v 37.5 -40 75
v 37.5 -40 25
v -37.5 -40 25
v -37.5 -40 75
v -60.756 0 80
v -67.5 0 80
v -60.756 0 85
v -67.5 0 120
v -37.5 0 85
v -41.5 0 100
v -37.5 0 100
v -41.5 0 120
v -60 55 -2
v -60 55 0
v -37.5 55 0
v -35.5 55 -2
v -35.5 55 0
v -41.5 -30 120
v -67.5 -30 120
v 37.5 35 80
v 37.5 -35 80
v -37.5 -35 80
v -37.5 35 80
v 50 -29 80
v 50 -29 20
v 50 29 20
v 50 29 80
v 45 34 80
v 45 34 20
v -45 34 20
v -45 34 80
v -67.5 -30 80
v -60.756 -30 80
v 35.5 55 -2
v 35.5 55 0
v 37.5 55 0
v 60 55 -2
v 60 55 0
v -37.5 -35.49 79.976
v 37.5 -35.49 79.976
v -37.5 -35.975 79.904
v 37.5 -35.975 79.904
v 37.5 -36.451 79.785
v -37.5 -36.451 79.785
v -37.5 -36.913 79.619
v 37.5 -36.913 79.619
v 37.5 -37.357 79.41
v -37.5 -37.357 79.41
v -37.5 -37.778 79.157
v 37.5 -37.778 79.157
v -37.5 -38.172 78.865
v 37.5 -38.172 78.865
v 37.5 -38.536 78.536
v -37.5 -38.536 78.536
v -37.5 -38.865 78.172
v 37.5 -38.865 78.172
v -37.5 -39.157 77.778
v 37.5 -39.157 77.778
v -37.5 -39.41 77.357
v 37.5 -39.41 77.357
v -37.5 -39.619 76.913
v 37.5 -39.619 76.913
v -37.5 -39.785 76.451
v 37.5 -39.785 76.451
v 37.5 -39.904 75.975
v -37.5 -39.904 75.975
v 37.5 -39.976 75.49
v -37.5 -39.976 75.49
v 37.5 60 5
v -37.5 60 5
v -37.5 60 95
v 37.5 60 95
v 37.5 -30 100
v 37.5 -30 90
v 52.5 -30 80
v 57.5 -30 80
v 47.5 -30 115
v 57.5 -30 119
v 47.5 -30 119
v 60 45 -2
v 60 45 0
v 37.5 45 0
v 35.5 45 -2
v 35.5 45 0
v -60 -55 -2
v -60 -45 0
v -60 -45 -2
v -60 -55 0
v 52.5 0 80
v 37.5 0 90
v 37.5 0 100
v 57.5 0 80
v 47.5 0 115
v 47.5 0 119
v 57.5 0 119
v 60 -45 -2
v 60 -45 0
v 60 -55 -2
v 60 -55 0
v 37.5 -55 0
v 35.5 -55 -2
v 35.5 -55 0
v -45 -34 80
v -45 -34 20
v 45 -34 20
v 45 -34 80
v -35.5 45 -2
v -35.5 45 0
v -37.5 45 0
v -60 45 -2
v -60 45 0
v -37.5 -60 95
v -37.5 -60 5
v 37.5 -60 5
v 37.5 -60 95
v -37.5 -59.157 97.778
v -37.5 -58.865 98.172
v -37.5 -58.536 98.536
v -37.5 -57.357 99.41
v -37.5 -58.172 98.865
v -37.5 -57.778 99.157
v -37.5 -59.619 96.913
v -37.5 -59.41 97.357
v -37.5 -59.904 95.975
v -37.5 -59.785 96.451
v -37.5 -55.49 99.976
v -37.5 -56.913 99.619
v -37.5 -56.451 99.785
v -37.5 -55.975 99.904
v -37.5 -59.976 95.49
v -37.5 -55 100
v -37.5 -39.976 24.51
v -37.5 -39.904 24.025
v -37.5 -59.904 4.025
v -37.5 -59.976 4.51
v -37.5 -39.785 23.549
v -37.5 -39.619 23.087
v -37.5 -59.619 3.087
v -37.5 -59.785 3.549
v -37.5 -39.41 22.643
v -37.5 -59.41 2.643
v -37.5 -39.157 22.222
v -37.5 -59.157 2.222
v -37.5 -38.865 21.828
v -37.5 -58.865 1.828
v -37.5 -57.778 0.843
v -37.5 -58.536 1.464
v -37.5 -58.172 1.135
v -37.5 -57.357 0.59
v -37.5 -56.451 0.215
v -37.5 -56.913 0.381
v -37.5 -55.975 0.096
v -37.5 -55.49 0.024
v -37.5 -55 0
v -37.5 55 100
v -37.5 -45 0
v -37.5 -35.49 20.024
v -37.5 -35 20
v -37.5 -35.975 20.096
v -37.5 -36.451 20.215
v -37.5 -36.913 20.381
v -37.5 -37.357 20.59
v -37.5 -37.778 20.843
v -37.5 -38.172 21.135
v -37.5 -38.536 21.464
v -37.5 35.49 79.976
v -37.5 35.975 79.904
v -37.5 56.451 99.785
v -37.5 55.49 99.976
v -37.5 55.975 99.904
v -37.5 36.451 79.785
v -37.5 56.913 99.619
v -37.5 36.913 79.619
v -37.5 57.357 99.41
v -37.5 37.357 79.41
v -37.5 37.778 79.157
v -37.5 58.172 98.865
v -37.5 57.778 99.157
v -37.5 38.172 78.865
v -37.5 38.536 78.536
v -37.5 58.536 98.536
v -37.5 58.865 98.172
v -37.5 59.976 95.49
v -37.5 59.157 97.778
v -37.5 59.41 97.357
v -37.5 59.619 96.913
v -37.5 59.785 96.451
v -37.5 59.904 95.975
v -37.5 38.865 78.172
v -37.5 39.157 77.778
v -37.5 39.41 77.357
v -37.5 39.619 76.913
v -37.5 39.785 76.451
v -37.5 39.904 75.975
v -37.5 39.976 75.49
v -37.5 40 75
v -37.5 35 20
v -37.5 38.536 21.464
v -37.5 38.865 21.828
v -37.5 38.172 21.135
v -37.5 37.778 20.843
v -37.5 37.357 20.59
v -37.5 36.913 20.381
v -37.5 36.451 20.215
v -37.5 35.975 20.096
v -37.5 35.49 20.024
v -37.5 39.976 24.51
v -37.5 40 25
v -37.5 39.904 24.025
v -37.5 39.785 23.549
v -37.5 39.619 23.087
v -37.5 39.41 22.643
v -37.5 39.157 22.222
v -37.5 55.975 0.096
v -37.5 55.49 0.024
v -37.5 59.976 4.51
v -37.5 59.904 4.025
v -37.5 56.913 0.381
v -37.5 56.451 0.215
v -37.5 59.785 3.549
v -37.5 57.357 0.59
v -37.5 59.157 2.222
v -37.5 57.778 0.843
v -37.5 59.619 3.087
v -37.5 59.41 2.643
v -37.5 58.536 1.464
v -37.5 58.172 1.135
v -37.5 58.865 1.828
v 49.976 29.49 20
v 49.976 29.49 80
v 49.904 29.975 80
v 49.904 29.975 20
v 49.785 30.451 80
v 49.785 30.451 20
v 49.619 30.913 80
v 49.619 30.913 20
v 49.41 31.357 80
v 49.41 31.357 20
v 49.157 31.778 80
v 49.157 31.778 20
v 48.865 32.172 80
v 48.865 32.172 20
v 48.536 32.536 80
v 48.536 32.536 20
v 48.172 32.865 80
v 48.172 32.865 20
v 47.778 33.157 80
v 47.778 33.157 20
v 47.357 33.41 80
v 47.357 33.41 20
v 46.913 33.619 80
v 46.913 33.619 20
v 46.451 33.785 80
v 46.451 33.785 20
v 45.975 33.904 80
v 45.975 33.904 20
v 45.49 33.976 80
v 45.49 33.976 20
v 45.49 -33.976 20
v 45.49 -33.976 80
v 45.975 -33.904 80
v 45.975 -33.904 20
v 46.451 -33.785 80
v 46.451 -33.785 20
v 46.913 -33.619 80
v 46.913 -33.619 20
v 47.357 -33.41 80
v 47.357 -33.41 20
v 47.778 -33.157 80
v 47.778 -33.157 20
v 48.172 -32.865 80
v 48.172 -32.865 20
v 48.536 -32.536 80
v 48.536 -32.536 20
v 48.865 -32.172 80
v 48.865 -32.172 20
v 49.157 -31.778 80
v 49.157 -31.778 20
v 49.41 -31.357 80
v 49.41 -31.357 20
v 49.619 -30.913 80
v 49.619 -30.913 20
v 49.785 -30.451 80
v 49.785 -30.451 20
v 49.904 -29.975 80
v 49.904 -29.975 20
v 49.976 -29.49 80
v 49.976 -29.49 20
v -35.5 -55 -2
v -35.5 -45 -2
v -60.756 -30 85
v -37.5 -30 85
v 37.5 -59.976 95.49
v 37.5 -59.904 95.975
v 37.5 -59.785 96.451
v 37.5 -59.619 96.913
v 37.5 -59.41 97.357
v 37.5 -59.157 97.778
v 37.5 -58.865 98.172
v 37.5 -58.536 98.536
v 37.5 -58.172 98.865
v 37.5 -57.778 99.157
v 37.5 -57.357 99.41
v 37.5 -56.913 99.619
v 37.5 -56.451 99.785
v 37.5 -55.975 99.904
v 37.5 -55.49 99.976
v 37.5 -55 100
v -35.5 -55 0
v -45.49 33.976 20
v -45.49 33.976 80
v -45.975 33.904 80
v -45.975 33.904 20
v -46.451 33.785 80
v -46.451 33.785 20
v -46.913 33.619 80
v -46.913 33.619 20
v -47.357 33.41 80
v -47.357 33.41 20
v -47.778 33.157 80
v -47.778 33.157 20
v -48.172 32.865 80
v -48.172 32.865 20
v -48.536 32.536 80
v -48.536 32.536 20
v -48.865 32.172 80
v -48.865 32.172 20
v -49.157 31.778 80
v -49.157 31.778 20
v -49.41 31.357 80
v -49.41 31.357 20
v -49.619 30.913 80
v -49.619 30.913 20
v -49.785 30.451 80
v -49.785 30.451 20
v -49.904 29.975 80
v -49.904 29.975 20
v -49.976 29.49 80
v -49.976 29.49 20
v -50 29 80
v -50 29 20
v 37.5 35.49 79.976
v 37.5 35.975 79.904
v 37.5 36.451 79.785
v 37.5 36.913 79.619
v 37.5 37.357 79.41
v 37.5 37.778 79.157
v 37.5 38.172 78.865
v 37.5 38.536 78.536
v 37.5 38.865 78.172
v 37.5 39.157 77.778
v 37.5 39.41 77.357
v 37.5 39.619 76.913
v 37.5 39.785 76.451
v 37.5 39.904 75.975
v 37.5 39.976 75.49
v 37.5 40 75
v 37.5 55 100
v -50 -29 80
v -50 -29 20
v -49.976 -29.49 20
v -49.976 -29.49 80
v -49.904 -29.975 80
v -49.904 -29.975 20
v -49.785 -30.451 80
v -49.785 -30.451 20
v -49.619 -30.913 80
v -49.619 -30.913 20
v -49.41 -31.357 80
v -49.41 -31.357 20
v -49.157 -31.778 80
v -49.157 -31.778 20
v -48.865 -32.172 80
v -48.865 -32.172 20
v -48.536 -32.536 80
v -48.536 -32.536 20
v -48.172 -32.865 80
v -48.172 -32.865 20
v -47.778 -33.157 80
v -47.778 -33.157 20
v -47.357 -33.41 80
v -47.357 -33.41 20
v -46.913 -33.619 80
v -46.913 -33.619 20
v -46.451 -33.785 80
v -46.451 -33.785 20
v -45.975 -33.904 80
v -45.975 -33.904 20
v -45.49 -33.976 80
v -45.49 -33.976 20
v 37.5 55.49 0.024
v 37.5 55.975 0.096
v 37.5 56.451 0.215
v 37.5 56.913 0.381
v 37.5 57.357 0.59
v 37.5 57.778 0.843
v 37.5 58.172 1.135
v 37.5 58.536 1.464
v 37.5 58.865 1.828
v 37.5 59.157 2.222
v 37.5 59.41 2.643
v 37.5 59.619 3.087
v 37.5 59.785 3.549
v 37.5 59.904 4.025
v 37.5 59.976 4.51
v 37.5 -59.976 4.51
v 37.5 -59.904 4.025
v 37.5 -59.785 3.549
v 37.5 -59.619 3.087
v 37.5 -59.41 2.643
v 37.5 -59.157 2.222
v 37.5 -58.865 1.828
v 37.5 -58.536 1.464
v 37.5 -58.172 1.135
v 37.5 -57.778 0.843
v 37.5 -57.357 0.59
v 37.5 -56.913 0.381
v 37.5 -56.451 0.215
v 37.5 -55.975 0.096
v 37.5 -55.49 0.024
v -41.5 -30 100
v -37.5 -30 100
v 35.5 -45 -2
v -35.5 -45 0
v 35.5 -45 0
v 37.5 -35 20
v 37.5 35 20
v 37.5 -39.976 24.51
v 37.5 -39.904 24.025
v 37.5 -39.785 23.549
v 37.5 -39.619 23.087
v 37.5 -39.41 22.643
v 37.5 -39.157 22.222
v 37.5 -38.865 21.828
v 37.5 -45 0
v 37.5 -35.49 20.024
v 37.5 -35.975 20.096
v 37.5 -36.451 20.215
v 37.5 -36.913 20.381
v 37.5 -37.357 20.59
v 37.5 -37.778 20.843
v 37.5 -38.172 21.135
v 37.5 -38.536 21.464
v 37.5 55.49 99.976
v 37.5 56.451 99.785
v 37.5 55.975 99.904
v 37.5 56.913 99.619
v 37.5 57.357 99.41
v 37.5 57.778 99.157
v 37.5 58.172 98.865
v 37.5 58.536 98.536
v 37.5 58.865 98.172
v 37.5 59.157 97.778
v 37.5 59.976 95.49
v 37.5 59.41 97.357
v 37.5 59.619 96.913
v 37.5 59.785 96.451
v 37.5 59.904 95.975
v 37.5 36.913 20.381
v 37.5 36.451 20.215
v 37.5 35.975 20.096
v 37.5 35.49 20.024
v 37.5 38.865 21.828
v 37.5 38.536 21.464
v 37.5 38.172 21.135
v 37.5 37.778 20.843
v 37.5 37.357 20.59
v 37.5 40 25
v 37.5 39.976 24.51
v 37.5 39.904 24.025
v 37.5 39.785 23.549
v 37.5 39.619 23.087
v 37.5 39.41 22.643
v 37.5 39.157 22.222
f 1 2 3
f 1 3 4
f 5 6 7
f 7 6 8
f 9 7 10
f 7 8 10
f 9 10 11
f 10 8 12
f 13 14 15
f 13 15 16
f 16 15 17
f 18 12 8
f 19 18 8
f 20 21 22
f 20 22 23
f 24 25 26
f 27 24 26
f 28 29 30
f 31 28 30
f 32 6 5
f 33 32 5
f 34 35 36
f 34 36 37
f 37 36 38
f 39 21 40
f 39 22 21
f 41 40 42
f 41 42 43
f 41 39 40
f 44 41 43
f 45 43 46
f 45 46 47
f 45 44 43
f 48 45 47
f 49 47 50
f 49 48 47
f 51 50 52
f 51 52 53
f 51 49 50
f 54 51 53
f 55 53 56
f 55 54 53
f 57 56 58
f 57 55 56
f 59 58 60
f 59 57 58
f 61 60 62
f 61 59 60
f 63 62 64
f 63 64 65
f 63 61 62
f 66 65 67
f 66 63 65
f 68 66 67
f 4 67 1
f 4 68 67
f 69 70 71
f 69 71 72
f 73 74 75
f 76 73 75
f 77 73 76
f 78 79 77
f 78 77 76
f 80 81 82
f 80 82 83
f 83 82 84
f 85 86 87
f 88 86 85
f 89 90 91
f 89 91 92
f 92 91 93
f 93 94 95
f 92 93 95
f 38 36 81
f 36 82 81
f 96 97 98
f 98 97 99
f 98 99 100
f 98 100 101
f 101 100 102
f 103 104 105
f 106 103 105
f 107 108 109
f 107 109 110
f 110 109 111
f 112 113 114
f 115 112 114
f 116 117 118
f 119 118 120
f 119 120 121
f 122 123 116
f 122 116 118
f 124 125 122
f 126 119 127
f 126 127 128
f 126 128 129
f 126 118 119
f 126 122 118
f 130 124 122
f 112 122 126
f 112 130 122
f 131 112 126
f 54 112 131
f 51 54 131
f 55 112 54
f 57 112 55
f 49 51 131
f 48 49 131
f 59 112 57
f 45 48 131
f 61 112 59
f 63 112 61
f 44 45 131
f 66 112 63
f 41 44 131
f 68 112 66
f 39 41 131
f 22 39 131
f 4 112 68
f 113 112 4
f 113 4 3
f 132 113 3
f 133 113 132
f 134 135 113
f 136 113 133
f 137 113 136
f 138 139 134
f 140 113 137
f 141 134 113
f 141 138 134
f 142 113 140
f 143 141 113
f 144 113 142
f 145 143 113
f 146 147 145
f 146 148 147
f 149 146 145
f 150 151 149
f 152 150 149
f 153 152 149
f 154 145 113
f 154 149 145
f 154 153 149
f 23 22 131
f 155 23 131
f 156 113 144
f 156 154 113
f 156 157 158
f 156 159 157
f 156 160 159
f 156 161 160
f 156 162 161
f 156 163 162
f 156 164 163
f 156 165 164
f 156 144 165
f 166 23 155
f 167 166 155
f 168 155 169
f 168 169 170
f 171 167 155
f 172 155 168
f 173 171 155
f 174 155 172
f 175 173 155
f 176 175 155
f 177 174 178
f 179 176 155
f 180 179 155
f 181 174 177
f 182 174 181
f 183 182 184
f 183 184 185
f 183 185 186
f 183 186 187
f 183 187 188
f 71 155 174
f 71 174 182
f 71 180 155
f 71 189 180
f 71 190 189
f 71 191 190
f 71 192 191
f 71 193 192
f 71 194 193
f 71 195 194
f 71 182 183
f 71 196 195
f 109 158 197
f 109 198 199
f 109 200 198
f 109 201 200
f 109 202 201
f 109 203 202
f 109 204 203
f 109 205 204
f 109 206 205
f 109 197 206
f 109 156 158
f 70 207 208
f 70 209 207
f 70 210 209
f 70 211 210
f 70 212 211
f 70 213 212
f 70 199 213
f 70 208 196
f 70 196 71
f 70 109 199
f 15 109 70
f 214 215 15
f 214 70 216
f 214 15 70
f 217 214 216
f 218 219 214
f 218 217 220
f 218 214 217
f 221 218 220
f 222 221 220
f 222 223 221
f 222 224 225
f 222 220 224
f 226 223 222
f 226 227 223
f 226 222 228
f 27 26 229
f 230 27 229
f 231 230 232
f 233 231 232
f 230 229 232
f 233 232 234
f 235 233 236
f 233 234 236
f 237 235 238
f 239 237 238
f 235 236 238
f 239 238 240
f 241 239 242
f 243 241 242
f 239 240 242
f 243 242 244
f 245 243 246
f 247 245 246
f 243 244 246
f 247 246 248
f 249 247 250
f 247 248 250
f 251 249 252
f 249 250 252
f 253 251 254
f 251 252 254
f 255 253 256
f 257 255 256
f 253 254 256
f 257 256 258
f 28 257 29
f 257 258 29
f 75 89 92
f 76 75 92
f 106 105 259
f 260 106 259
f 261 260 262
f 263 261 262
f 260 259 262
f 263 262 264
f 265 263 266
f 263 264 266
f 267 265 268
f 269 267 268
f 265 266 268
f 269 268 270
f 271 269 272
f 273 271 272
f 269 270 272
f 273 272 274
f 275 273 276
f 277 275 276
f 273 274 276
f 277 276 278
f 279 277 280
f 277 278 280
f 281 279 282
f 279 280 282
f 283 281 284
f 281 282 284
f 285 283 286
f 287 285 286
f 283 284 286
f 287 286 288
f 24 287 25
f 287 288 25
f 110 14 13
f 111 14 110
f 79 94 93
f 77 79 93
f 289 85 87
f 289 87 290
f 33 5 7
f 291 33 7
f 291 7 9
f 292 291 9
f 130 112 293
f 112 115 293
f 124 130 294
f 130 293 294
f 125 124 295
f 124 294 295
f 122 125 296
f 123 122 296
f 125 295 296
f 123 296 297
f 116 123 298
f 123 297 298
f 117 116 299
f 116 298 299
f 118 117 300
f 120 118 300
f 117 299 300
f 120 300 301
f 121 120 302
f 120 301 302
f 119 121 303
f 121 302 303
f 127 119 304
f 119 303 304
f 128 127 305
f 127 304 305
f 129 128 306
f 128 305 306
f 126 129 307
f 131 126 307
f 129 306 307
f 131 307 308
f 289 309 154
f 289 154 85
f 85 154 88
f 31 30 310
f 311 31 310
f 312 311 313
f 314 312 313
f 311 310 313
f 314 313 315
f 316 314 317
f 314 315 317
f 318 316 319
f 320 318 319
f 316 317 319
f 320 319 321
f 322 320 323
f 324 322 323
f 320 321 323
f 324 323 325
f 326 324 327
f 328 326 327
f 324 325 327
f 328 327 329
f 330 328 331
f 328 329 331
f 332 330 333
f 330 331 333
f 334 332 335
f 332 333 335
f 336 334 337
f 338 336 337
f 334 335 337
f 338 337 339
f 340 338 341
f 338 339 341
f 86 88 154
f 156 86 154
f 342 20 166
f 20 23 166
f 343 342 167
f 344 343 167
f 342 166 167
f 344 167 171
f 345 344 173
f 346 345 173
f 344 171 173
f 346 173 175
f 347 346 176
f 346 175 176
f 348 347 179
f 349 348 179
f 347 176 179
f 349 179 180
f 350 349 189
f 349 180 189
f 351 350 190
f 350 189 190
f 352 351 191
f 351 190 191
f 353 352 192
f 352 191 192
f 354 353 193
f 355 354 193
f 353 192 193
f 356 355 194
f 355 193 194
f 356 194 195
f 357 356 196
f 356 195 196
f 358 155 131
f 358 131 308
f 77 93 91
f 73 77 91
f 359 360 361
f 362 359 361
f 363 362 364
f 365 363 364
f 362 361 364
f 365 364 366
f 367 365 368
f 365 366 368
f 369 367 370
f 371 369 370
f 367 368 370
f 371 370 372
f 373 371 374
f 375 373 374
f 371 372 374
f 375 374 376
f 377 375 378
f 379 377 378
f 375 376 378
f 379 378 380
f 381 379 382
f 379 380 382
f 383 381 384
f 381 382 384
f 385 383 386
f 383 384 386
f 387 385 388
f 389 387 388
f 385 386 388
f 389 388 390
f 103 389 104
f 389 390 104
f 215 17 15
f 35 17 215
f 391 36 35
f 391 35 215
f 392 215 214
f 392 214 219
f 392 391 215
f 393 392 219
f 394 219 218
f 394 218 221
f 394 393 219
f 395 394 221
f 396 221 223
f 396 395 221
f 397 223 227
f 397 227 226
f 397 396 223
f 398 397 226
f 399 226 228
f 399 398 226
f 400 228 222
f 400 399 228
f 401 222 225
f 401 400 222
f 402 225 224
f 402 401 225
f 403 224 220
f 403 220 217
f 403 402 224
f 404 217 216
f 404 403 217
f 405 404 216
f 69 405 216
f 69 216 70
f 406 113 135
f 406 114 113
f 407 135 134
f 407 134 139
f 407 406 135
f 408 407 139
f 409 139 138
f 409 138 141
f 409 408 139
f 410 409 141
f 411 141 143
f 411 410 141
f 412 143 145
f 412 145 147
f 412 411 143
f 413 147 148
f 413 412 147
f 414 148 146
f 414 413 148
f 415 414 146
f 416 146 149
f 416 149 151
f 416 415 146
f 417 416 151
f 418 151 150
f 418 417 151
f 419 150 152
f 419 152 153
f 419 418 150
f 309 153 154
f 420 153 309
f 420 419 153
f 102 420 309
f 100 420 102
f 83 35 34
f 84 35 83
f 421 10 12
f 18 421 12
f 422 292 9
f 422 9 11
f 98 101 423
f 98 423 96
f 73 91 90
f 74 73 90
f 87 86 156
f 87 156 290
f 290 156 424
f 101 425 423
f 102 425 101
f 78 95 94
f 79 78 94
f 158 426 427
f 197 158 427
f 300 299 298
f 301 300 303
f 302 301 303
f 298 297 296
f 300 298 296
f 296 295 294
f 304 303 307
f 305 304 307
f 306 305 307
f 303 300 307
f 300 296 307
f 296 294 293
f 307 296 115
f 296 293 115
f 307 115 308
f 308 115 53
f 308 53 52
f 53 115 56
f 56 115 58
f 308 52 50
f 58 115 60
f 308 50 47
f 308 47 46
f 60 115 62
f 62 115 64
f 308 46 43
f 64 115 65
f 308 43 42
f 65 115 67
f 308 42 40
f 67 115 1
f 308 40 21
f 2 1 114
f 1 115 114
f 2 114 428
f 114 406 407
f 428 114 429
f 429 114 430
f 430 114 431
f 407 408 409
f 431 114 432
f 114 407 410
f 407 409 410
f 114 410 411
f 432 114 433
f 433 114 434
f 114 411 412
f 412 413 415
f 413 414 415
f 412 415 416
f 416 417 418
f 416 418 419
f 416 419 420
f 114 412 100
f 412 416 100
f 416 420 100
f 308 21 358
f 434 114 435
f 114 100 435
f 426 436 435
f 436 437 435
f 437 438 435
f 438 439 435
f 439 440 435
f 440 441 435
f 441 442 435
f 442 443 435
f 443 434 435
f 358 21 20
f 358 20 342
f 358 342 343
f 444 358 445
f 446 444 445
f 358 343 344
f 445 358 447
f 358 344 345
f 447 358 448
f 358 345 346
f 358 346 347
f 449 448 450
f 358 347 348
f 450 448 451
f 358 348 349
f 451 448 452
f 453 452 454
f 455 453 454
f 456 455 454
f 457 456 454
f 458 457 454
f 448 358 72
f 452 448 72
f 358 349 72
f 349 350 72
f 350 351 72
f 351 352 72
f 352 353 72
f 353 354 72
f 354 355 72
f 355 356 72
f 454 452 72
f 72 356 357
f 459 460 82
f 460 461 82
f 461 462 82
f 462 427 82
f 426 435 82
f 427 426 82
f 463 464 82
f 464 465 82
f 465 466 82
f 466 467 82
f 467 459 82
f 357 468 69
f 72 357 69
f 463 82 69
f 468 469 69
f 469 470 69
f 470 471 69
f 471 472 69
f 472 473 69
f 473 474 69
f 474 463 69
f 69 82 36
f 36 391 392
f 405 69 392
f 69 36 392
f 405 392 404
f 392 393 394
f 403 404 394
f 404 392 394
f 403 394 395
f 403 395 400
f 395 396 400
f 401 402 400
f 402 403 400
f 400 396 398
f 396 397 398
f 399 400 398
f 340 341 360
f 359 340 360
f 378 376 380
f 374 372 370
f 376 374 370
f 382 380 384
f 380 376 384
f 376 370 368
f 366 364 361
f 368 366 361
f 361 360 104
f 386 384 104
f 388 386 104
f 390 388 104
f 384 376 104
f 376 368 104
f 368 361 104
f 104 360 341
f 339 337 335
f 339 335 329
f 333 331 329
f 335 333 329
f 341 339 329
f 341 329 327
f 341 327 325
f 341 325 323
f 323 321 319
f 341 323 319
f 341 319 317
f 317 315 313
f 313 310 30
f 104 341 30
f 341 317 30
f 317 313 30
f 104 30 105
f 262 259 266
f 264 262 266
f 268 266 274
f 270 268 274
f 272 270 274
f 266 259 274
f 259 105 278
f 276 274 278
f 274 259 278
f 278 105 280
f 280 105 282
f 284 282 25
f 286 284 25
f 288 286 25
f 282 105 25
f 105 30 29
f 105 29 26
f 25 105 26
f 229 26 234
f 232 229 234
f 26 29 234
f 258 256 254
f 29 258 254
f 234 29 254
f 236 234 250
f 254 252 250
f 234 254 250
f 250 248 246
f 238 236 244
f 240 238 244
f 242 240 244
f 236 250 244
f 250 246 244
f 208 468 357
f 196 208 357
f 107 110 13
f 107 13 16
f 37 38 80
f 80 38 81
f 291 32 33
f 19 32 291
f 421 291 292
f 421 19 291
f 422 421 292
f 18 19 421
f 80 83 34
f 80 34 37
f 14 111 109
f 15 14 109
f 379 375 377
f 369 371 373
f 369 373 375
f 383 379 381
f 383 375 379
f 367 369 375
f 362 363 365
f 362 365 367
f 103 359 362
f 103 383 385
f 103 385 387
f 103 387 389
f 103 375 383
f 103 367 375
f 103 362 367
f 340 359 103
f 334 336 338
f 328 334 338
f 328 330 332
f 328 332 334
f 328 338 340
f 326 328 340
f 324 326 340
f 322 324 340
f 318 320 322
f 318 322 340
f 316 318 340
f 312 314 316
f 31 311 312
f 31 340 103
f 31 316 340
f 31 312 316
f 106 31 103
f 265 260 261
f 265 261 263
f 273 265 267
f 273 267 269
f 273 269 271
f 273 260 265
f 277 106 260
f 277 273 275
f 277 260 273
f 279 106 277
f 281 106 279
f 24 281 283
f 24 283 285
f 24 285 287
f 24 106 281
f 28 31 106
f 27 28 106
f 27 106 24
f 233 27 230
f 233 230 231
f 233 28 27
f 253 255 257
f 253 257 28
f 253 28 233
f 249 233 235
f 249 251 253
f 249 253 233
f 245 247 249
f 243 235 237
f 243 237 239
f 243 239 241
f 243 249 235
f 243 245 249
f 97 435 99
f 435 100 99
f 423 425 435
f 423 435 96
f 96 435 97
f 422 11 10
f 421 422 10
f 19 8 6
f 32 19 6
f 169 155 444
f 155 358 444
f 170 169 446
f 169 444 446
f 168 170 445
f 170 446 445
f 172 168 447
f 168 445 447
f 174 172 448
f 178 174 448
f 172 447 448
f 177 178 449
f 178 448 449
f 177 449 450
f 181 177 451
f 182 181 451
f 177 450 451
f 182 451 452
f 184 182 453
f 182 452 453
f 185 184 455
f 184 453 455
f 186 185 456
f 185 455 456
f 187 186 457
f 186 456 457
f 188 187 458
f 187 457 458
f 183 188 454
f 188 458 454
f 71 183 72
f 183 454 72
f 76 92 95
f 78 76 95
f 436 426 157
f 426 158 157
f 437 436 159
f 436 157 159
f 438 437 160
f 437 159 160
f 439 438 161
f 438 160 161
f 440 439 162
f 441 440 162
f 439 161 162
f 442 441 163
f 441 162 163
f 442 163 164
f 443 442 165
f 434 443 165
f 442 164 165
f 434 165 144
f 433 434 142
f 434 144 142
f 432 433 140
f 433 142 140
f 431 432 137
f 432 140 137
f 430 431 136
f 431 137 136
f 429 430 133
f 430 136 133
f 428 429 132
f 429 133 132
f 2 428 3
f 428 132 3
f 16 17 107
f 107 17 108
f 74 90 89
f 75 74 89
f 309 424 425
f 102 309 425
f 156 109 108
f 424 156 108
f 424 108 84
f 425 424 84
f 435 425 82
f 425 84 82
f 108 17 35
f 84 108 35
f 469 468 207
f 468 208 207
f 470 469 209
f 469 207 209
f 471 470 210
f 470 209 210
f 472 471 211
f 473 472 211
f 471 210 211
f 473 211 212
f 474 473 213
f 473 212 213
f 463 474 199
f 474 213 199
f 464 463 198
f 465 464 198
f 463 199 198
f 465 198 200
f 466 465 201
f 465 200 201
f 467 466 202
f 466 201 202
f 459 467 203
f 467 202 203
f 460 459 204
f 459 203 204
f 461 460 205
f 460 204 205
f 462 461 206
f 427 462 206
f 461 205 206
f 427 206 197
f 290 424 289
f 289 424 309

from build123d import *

# Parameters (mm, degrees)
F0_W      = 75
F0_H      = 120
F1_DEPTH  = 100
F2_W      = 80
F2_H      = 60
F3_DEPTH  = 75.001
F4_R      = 5
F5_W      = 75
F5_H      = 68
F6_DEPTH  = 60
F7_W      = 22.5
F7_H      = 10
F7_W_2    = 2
F8_DEPTH  = 2
F10_DEPTH = 30


with BuildPart() as f1:
    # F0 (on Top) → F1 (new body)
    with BuildSketch(Plane.XY):
        Rectangle(F0_W, F0_H)
    extrude(amount=F1_DEPTH)

    # F2 (on face) → F3 (cut, through all)
    with BuildSketch(Plane.YZ.offset(37.5)):
        with Locations((0, 50)):
            Rectangle(F2_W, F2_H)
    extrude(amount=-F3_DEPTH, mode=Mode.SUBTRACT)

    # F4
    f4_edges = [f1.edges().sort_by_distance(p)[0] for p in [
        (0, 40, 20),
        (0, -60, 100),
        (0, -60, 0),
        (0, -40, 20),
        (0, 60, 0),
        (0, 60, 100),
        (0, -40, 80),
        (0, 40, 80),
    ]]
    fillet(f4_edges, radius=F4_R)

    # F7 (on face) → F8 (join)
    with BuildSketch(Plane(origin=(0, 0, 0), x_dir=(1, 0, 0), z_dir=(0, 0, -1))):
        with Locations((-48.75, 50)):
            Rectangle(F7_W, F7_H)
        with Locations((48.75, 50)):
            Rectangle(F7_W, F7_H)
        with Locations((48.75, -50)):
            Rectangle(F7_W, F7_H)
        with Locations((-48.75, -50)):
            Rectangle(F7_W, F7_H)
        with Locations((-36.5, 50)):
            Rectangle(F7_W_2, F7_H)
        with Locations((36.5, 50)):
            Rectangle(F7_W_2, F7_H)
        with Locations((36.5, -50)):
            Rectangle(F7_W_2, F7_H)
        with Locations((-36.5, -50)):
            Rectangle(F7_W_2, F7_H)
    extrude(amount=F8_DEPTH)


with BuildPart() as f6:
    # F5 (on face) → F6 (new body)
    with BuildSketch(Plane.XY.offset(20)):
        with BuildLine():
            Line((-37.5, 34), (-45, 34))
            ThreePointArc((-45, 34), (-48.5355339059, 32.5355339059), (-50, 29))
            Line((-50, 29), (-50, -29))
            ThreePointArc((-50, -29), (-48.5355339059, -32.5355339059), (-45, -34))
            Line((-45, -34), (-37.5, -34))
            Line((-37.5, -34), (-37.5, 34))
        make_face()
        Rectangle(F5_W, F5_H)
        with BuildLine():
            Line((45, 34), (37.5, 34))
            Line((37.5, 34), (37.5, -34))
            Line((37.5, -34), (45, -34))
            ThreePointArc((45, -34), (48.5355339059, -32.5355339059), (50, -29))
            Line((50, -29), (50, 29))
            ThreePointArc((50, 29), (48.5355339059, 32.5355339059), (45, 34))
        make_face()
    extrude(amount=F6_DEPTH)


with BuildPart() as f10:
    # F9 (on Front) → F10 (new body)
    with BuildSketch(Plane.XZ):
        Polygon((-37.5, 85), (-37.5, 100), (-41.5, 100), (-41.5, 120), (-67.5, 120), (-67.5, 80), (-60.756136775, 80), (-60.756136775, 85), align=None)
    extrude(amount=F10_DEPTH)


with BuildPart() as f10b:
    # F9 (on Front) → F10, piece 2 (new body)
    with BuildSketch(Plane.XZ):
        Polygon((47.5, 115), (37.5, 100), (37.5, 95), (37.5, 90), (52.5, 80), (57.5, 80), (57.5, 119), (47.5, 119), align=None)
    extrude(amount=F10_DEPTH)


solid = Compound([f1.part, f6.part, f10.part, f10b.part])
